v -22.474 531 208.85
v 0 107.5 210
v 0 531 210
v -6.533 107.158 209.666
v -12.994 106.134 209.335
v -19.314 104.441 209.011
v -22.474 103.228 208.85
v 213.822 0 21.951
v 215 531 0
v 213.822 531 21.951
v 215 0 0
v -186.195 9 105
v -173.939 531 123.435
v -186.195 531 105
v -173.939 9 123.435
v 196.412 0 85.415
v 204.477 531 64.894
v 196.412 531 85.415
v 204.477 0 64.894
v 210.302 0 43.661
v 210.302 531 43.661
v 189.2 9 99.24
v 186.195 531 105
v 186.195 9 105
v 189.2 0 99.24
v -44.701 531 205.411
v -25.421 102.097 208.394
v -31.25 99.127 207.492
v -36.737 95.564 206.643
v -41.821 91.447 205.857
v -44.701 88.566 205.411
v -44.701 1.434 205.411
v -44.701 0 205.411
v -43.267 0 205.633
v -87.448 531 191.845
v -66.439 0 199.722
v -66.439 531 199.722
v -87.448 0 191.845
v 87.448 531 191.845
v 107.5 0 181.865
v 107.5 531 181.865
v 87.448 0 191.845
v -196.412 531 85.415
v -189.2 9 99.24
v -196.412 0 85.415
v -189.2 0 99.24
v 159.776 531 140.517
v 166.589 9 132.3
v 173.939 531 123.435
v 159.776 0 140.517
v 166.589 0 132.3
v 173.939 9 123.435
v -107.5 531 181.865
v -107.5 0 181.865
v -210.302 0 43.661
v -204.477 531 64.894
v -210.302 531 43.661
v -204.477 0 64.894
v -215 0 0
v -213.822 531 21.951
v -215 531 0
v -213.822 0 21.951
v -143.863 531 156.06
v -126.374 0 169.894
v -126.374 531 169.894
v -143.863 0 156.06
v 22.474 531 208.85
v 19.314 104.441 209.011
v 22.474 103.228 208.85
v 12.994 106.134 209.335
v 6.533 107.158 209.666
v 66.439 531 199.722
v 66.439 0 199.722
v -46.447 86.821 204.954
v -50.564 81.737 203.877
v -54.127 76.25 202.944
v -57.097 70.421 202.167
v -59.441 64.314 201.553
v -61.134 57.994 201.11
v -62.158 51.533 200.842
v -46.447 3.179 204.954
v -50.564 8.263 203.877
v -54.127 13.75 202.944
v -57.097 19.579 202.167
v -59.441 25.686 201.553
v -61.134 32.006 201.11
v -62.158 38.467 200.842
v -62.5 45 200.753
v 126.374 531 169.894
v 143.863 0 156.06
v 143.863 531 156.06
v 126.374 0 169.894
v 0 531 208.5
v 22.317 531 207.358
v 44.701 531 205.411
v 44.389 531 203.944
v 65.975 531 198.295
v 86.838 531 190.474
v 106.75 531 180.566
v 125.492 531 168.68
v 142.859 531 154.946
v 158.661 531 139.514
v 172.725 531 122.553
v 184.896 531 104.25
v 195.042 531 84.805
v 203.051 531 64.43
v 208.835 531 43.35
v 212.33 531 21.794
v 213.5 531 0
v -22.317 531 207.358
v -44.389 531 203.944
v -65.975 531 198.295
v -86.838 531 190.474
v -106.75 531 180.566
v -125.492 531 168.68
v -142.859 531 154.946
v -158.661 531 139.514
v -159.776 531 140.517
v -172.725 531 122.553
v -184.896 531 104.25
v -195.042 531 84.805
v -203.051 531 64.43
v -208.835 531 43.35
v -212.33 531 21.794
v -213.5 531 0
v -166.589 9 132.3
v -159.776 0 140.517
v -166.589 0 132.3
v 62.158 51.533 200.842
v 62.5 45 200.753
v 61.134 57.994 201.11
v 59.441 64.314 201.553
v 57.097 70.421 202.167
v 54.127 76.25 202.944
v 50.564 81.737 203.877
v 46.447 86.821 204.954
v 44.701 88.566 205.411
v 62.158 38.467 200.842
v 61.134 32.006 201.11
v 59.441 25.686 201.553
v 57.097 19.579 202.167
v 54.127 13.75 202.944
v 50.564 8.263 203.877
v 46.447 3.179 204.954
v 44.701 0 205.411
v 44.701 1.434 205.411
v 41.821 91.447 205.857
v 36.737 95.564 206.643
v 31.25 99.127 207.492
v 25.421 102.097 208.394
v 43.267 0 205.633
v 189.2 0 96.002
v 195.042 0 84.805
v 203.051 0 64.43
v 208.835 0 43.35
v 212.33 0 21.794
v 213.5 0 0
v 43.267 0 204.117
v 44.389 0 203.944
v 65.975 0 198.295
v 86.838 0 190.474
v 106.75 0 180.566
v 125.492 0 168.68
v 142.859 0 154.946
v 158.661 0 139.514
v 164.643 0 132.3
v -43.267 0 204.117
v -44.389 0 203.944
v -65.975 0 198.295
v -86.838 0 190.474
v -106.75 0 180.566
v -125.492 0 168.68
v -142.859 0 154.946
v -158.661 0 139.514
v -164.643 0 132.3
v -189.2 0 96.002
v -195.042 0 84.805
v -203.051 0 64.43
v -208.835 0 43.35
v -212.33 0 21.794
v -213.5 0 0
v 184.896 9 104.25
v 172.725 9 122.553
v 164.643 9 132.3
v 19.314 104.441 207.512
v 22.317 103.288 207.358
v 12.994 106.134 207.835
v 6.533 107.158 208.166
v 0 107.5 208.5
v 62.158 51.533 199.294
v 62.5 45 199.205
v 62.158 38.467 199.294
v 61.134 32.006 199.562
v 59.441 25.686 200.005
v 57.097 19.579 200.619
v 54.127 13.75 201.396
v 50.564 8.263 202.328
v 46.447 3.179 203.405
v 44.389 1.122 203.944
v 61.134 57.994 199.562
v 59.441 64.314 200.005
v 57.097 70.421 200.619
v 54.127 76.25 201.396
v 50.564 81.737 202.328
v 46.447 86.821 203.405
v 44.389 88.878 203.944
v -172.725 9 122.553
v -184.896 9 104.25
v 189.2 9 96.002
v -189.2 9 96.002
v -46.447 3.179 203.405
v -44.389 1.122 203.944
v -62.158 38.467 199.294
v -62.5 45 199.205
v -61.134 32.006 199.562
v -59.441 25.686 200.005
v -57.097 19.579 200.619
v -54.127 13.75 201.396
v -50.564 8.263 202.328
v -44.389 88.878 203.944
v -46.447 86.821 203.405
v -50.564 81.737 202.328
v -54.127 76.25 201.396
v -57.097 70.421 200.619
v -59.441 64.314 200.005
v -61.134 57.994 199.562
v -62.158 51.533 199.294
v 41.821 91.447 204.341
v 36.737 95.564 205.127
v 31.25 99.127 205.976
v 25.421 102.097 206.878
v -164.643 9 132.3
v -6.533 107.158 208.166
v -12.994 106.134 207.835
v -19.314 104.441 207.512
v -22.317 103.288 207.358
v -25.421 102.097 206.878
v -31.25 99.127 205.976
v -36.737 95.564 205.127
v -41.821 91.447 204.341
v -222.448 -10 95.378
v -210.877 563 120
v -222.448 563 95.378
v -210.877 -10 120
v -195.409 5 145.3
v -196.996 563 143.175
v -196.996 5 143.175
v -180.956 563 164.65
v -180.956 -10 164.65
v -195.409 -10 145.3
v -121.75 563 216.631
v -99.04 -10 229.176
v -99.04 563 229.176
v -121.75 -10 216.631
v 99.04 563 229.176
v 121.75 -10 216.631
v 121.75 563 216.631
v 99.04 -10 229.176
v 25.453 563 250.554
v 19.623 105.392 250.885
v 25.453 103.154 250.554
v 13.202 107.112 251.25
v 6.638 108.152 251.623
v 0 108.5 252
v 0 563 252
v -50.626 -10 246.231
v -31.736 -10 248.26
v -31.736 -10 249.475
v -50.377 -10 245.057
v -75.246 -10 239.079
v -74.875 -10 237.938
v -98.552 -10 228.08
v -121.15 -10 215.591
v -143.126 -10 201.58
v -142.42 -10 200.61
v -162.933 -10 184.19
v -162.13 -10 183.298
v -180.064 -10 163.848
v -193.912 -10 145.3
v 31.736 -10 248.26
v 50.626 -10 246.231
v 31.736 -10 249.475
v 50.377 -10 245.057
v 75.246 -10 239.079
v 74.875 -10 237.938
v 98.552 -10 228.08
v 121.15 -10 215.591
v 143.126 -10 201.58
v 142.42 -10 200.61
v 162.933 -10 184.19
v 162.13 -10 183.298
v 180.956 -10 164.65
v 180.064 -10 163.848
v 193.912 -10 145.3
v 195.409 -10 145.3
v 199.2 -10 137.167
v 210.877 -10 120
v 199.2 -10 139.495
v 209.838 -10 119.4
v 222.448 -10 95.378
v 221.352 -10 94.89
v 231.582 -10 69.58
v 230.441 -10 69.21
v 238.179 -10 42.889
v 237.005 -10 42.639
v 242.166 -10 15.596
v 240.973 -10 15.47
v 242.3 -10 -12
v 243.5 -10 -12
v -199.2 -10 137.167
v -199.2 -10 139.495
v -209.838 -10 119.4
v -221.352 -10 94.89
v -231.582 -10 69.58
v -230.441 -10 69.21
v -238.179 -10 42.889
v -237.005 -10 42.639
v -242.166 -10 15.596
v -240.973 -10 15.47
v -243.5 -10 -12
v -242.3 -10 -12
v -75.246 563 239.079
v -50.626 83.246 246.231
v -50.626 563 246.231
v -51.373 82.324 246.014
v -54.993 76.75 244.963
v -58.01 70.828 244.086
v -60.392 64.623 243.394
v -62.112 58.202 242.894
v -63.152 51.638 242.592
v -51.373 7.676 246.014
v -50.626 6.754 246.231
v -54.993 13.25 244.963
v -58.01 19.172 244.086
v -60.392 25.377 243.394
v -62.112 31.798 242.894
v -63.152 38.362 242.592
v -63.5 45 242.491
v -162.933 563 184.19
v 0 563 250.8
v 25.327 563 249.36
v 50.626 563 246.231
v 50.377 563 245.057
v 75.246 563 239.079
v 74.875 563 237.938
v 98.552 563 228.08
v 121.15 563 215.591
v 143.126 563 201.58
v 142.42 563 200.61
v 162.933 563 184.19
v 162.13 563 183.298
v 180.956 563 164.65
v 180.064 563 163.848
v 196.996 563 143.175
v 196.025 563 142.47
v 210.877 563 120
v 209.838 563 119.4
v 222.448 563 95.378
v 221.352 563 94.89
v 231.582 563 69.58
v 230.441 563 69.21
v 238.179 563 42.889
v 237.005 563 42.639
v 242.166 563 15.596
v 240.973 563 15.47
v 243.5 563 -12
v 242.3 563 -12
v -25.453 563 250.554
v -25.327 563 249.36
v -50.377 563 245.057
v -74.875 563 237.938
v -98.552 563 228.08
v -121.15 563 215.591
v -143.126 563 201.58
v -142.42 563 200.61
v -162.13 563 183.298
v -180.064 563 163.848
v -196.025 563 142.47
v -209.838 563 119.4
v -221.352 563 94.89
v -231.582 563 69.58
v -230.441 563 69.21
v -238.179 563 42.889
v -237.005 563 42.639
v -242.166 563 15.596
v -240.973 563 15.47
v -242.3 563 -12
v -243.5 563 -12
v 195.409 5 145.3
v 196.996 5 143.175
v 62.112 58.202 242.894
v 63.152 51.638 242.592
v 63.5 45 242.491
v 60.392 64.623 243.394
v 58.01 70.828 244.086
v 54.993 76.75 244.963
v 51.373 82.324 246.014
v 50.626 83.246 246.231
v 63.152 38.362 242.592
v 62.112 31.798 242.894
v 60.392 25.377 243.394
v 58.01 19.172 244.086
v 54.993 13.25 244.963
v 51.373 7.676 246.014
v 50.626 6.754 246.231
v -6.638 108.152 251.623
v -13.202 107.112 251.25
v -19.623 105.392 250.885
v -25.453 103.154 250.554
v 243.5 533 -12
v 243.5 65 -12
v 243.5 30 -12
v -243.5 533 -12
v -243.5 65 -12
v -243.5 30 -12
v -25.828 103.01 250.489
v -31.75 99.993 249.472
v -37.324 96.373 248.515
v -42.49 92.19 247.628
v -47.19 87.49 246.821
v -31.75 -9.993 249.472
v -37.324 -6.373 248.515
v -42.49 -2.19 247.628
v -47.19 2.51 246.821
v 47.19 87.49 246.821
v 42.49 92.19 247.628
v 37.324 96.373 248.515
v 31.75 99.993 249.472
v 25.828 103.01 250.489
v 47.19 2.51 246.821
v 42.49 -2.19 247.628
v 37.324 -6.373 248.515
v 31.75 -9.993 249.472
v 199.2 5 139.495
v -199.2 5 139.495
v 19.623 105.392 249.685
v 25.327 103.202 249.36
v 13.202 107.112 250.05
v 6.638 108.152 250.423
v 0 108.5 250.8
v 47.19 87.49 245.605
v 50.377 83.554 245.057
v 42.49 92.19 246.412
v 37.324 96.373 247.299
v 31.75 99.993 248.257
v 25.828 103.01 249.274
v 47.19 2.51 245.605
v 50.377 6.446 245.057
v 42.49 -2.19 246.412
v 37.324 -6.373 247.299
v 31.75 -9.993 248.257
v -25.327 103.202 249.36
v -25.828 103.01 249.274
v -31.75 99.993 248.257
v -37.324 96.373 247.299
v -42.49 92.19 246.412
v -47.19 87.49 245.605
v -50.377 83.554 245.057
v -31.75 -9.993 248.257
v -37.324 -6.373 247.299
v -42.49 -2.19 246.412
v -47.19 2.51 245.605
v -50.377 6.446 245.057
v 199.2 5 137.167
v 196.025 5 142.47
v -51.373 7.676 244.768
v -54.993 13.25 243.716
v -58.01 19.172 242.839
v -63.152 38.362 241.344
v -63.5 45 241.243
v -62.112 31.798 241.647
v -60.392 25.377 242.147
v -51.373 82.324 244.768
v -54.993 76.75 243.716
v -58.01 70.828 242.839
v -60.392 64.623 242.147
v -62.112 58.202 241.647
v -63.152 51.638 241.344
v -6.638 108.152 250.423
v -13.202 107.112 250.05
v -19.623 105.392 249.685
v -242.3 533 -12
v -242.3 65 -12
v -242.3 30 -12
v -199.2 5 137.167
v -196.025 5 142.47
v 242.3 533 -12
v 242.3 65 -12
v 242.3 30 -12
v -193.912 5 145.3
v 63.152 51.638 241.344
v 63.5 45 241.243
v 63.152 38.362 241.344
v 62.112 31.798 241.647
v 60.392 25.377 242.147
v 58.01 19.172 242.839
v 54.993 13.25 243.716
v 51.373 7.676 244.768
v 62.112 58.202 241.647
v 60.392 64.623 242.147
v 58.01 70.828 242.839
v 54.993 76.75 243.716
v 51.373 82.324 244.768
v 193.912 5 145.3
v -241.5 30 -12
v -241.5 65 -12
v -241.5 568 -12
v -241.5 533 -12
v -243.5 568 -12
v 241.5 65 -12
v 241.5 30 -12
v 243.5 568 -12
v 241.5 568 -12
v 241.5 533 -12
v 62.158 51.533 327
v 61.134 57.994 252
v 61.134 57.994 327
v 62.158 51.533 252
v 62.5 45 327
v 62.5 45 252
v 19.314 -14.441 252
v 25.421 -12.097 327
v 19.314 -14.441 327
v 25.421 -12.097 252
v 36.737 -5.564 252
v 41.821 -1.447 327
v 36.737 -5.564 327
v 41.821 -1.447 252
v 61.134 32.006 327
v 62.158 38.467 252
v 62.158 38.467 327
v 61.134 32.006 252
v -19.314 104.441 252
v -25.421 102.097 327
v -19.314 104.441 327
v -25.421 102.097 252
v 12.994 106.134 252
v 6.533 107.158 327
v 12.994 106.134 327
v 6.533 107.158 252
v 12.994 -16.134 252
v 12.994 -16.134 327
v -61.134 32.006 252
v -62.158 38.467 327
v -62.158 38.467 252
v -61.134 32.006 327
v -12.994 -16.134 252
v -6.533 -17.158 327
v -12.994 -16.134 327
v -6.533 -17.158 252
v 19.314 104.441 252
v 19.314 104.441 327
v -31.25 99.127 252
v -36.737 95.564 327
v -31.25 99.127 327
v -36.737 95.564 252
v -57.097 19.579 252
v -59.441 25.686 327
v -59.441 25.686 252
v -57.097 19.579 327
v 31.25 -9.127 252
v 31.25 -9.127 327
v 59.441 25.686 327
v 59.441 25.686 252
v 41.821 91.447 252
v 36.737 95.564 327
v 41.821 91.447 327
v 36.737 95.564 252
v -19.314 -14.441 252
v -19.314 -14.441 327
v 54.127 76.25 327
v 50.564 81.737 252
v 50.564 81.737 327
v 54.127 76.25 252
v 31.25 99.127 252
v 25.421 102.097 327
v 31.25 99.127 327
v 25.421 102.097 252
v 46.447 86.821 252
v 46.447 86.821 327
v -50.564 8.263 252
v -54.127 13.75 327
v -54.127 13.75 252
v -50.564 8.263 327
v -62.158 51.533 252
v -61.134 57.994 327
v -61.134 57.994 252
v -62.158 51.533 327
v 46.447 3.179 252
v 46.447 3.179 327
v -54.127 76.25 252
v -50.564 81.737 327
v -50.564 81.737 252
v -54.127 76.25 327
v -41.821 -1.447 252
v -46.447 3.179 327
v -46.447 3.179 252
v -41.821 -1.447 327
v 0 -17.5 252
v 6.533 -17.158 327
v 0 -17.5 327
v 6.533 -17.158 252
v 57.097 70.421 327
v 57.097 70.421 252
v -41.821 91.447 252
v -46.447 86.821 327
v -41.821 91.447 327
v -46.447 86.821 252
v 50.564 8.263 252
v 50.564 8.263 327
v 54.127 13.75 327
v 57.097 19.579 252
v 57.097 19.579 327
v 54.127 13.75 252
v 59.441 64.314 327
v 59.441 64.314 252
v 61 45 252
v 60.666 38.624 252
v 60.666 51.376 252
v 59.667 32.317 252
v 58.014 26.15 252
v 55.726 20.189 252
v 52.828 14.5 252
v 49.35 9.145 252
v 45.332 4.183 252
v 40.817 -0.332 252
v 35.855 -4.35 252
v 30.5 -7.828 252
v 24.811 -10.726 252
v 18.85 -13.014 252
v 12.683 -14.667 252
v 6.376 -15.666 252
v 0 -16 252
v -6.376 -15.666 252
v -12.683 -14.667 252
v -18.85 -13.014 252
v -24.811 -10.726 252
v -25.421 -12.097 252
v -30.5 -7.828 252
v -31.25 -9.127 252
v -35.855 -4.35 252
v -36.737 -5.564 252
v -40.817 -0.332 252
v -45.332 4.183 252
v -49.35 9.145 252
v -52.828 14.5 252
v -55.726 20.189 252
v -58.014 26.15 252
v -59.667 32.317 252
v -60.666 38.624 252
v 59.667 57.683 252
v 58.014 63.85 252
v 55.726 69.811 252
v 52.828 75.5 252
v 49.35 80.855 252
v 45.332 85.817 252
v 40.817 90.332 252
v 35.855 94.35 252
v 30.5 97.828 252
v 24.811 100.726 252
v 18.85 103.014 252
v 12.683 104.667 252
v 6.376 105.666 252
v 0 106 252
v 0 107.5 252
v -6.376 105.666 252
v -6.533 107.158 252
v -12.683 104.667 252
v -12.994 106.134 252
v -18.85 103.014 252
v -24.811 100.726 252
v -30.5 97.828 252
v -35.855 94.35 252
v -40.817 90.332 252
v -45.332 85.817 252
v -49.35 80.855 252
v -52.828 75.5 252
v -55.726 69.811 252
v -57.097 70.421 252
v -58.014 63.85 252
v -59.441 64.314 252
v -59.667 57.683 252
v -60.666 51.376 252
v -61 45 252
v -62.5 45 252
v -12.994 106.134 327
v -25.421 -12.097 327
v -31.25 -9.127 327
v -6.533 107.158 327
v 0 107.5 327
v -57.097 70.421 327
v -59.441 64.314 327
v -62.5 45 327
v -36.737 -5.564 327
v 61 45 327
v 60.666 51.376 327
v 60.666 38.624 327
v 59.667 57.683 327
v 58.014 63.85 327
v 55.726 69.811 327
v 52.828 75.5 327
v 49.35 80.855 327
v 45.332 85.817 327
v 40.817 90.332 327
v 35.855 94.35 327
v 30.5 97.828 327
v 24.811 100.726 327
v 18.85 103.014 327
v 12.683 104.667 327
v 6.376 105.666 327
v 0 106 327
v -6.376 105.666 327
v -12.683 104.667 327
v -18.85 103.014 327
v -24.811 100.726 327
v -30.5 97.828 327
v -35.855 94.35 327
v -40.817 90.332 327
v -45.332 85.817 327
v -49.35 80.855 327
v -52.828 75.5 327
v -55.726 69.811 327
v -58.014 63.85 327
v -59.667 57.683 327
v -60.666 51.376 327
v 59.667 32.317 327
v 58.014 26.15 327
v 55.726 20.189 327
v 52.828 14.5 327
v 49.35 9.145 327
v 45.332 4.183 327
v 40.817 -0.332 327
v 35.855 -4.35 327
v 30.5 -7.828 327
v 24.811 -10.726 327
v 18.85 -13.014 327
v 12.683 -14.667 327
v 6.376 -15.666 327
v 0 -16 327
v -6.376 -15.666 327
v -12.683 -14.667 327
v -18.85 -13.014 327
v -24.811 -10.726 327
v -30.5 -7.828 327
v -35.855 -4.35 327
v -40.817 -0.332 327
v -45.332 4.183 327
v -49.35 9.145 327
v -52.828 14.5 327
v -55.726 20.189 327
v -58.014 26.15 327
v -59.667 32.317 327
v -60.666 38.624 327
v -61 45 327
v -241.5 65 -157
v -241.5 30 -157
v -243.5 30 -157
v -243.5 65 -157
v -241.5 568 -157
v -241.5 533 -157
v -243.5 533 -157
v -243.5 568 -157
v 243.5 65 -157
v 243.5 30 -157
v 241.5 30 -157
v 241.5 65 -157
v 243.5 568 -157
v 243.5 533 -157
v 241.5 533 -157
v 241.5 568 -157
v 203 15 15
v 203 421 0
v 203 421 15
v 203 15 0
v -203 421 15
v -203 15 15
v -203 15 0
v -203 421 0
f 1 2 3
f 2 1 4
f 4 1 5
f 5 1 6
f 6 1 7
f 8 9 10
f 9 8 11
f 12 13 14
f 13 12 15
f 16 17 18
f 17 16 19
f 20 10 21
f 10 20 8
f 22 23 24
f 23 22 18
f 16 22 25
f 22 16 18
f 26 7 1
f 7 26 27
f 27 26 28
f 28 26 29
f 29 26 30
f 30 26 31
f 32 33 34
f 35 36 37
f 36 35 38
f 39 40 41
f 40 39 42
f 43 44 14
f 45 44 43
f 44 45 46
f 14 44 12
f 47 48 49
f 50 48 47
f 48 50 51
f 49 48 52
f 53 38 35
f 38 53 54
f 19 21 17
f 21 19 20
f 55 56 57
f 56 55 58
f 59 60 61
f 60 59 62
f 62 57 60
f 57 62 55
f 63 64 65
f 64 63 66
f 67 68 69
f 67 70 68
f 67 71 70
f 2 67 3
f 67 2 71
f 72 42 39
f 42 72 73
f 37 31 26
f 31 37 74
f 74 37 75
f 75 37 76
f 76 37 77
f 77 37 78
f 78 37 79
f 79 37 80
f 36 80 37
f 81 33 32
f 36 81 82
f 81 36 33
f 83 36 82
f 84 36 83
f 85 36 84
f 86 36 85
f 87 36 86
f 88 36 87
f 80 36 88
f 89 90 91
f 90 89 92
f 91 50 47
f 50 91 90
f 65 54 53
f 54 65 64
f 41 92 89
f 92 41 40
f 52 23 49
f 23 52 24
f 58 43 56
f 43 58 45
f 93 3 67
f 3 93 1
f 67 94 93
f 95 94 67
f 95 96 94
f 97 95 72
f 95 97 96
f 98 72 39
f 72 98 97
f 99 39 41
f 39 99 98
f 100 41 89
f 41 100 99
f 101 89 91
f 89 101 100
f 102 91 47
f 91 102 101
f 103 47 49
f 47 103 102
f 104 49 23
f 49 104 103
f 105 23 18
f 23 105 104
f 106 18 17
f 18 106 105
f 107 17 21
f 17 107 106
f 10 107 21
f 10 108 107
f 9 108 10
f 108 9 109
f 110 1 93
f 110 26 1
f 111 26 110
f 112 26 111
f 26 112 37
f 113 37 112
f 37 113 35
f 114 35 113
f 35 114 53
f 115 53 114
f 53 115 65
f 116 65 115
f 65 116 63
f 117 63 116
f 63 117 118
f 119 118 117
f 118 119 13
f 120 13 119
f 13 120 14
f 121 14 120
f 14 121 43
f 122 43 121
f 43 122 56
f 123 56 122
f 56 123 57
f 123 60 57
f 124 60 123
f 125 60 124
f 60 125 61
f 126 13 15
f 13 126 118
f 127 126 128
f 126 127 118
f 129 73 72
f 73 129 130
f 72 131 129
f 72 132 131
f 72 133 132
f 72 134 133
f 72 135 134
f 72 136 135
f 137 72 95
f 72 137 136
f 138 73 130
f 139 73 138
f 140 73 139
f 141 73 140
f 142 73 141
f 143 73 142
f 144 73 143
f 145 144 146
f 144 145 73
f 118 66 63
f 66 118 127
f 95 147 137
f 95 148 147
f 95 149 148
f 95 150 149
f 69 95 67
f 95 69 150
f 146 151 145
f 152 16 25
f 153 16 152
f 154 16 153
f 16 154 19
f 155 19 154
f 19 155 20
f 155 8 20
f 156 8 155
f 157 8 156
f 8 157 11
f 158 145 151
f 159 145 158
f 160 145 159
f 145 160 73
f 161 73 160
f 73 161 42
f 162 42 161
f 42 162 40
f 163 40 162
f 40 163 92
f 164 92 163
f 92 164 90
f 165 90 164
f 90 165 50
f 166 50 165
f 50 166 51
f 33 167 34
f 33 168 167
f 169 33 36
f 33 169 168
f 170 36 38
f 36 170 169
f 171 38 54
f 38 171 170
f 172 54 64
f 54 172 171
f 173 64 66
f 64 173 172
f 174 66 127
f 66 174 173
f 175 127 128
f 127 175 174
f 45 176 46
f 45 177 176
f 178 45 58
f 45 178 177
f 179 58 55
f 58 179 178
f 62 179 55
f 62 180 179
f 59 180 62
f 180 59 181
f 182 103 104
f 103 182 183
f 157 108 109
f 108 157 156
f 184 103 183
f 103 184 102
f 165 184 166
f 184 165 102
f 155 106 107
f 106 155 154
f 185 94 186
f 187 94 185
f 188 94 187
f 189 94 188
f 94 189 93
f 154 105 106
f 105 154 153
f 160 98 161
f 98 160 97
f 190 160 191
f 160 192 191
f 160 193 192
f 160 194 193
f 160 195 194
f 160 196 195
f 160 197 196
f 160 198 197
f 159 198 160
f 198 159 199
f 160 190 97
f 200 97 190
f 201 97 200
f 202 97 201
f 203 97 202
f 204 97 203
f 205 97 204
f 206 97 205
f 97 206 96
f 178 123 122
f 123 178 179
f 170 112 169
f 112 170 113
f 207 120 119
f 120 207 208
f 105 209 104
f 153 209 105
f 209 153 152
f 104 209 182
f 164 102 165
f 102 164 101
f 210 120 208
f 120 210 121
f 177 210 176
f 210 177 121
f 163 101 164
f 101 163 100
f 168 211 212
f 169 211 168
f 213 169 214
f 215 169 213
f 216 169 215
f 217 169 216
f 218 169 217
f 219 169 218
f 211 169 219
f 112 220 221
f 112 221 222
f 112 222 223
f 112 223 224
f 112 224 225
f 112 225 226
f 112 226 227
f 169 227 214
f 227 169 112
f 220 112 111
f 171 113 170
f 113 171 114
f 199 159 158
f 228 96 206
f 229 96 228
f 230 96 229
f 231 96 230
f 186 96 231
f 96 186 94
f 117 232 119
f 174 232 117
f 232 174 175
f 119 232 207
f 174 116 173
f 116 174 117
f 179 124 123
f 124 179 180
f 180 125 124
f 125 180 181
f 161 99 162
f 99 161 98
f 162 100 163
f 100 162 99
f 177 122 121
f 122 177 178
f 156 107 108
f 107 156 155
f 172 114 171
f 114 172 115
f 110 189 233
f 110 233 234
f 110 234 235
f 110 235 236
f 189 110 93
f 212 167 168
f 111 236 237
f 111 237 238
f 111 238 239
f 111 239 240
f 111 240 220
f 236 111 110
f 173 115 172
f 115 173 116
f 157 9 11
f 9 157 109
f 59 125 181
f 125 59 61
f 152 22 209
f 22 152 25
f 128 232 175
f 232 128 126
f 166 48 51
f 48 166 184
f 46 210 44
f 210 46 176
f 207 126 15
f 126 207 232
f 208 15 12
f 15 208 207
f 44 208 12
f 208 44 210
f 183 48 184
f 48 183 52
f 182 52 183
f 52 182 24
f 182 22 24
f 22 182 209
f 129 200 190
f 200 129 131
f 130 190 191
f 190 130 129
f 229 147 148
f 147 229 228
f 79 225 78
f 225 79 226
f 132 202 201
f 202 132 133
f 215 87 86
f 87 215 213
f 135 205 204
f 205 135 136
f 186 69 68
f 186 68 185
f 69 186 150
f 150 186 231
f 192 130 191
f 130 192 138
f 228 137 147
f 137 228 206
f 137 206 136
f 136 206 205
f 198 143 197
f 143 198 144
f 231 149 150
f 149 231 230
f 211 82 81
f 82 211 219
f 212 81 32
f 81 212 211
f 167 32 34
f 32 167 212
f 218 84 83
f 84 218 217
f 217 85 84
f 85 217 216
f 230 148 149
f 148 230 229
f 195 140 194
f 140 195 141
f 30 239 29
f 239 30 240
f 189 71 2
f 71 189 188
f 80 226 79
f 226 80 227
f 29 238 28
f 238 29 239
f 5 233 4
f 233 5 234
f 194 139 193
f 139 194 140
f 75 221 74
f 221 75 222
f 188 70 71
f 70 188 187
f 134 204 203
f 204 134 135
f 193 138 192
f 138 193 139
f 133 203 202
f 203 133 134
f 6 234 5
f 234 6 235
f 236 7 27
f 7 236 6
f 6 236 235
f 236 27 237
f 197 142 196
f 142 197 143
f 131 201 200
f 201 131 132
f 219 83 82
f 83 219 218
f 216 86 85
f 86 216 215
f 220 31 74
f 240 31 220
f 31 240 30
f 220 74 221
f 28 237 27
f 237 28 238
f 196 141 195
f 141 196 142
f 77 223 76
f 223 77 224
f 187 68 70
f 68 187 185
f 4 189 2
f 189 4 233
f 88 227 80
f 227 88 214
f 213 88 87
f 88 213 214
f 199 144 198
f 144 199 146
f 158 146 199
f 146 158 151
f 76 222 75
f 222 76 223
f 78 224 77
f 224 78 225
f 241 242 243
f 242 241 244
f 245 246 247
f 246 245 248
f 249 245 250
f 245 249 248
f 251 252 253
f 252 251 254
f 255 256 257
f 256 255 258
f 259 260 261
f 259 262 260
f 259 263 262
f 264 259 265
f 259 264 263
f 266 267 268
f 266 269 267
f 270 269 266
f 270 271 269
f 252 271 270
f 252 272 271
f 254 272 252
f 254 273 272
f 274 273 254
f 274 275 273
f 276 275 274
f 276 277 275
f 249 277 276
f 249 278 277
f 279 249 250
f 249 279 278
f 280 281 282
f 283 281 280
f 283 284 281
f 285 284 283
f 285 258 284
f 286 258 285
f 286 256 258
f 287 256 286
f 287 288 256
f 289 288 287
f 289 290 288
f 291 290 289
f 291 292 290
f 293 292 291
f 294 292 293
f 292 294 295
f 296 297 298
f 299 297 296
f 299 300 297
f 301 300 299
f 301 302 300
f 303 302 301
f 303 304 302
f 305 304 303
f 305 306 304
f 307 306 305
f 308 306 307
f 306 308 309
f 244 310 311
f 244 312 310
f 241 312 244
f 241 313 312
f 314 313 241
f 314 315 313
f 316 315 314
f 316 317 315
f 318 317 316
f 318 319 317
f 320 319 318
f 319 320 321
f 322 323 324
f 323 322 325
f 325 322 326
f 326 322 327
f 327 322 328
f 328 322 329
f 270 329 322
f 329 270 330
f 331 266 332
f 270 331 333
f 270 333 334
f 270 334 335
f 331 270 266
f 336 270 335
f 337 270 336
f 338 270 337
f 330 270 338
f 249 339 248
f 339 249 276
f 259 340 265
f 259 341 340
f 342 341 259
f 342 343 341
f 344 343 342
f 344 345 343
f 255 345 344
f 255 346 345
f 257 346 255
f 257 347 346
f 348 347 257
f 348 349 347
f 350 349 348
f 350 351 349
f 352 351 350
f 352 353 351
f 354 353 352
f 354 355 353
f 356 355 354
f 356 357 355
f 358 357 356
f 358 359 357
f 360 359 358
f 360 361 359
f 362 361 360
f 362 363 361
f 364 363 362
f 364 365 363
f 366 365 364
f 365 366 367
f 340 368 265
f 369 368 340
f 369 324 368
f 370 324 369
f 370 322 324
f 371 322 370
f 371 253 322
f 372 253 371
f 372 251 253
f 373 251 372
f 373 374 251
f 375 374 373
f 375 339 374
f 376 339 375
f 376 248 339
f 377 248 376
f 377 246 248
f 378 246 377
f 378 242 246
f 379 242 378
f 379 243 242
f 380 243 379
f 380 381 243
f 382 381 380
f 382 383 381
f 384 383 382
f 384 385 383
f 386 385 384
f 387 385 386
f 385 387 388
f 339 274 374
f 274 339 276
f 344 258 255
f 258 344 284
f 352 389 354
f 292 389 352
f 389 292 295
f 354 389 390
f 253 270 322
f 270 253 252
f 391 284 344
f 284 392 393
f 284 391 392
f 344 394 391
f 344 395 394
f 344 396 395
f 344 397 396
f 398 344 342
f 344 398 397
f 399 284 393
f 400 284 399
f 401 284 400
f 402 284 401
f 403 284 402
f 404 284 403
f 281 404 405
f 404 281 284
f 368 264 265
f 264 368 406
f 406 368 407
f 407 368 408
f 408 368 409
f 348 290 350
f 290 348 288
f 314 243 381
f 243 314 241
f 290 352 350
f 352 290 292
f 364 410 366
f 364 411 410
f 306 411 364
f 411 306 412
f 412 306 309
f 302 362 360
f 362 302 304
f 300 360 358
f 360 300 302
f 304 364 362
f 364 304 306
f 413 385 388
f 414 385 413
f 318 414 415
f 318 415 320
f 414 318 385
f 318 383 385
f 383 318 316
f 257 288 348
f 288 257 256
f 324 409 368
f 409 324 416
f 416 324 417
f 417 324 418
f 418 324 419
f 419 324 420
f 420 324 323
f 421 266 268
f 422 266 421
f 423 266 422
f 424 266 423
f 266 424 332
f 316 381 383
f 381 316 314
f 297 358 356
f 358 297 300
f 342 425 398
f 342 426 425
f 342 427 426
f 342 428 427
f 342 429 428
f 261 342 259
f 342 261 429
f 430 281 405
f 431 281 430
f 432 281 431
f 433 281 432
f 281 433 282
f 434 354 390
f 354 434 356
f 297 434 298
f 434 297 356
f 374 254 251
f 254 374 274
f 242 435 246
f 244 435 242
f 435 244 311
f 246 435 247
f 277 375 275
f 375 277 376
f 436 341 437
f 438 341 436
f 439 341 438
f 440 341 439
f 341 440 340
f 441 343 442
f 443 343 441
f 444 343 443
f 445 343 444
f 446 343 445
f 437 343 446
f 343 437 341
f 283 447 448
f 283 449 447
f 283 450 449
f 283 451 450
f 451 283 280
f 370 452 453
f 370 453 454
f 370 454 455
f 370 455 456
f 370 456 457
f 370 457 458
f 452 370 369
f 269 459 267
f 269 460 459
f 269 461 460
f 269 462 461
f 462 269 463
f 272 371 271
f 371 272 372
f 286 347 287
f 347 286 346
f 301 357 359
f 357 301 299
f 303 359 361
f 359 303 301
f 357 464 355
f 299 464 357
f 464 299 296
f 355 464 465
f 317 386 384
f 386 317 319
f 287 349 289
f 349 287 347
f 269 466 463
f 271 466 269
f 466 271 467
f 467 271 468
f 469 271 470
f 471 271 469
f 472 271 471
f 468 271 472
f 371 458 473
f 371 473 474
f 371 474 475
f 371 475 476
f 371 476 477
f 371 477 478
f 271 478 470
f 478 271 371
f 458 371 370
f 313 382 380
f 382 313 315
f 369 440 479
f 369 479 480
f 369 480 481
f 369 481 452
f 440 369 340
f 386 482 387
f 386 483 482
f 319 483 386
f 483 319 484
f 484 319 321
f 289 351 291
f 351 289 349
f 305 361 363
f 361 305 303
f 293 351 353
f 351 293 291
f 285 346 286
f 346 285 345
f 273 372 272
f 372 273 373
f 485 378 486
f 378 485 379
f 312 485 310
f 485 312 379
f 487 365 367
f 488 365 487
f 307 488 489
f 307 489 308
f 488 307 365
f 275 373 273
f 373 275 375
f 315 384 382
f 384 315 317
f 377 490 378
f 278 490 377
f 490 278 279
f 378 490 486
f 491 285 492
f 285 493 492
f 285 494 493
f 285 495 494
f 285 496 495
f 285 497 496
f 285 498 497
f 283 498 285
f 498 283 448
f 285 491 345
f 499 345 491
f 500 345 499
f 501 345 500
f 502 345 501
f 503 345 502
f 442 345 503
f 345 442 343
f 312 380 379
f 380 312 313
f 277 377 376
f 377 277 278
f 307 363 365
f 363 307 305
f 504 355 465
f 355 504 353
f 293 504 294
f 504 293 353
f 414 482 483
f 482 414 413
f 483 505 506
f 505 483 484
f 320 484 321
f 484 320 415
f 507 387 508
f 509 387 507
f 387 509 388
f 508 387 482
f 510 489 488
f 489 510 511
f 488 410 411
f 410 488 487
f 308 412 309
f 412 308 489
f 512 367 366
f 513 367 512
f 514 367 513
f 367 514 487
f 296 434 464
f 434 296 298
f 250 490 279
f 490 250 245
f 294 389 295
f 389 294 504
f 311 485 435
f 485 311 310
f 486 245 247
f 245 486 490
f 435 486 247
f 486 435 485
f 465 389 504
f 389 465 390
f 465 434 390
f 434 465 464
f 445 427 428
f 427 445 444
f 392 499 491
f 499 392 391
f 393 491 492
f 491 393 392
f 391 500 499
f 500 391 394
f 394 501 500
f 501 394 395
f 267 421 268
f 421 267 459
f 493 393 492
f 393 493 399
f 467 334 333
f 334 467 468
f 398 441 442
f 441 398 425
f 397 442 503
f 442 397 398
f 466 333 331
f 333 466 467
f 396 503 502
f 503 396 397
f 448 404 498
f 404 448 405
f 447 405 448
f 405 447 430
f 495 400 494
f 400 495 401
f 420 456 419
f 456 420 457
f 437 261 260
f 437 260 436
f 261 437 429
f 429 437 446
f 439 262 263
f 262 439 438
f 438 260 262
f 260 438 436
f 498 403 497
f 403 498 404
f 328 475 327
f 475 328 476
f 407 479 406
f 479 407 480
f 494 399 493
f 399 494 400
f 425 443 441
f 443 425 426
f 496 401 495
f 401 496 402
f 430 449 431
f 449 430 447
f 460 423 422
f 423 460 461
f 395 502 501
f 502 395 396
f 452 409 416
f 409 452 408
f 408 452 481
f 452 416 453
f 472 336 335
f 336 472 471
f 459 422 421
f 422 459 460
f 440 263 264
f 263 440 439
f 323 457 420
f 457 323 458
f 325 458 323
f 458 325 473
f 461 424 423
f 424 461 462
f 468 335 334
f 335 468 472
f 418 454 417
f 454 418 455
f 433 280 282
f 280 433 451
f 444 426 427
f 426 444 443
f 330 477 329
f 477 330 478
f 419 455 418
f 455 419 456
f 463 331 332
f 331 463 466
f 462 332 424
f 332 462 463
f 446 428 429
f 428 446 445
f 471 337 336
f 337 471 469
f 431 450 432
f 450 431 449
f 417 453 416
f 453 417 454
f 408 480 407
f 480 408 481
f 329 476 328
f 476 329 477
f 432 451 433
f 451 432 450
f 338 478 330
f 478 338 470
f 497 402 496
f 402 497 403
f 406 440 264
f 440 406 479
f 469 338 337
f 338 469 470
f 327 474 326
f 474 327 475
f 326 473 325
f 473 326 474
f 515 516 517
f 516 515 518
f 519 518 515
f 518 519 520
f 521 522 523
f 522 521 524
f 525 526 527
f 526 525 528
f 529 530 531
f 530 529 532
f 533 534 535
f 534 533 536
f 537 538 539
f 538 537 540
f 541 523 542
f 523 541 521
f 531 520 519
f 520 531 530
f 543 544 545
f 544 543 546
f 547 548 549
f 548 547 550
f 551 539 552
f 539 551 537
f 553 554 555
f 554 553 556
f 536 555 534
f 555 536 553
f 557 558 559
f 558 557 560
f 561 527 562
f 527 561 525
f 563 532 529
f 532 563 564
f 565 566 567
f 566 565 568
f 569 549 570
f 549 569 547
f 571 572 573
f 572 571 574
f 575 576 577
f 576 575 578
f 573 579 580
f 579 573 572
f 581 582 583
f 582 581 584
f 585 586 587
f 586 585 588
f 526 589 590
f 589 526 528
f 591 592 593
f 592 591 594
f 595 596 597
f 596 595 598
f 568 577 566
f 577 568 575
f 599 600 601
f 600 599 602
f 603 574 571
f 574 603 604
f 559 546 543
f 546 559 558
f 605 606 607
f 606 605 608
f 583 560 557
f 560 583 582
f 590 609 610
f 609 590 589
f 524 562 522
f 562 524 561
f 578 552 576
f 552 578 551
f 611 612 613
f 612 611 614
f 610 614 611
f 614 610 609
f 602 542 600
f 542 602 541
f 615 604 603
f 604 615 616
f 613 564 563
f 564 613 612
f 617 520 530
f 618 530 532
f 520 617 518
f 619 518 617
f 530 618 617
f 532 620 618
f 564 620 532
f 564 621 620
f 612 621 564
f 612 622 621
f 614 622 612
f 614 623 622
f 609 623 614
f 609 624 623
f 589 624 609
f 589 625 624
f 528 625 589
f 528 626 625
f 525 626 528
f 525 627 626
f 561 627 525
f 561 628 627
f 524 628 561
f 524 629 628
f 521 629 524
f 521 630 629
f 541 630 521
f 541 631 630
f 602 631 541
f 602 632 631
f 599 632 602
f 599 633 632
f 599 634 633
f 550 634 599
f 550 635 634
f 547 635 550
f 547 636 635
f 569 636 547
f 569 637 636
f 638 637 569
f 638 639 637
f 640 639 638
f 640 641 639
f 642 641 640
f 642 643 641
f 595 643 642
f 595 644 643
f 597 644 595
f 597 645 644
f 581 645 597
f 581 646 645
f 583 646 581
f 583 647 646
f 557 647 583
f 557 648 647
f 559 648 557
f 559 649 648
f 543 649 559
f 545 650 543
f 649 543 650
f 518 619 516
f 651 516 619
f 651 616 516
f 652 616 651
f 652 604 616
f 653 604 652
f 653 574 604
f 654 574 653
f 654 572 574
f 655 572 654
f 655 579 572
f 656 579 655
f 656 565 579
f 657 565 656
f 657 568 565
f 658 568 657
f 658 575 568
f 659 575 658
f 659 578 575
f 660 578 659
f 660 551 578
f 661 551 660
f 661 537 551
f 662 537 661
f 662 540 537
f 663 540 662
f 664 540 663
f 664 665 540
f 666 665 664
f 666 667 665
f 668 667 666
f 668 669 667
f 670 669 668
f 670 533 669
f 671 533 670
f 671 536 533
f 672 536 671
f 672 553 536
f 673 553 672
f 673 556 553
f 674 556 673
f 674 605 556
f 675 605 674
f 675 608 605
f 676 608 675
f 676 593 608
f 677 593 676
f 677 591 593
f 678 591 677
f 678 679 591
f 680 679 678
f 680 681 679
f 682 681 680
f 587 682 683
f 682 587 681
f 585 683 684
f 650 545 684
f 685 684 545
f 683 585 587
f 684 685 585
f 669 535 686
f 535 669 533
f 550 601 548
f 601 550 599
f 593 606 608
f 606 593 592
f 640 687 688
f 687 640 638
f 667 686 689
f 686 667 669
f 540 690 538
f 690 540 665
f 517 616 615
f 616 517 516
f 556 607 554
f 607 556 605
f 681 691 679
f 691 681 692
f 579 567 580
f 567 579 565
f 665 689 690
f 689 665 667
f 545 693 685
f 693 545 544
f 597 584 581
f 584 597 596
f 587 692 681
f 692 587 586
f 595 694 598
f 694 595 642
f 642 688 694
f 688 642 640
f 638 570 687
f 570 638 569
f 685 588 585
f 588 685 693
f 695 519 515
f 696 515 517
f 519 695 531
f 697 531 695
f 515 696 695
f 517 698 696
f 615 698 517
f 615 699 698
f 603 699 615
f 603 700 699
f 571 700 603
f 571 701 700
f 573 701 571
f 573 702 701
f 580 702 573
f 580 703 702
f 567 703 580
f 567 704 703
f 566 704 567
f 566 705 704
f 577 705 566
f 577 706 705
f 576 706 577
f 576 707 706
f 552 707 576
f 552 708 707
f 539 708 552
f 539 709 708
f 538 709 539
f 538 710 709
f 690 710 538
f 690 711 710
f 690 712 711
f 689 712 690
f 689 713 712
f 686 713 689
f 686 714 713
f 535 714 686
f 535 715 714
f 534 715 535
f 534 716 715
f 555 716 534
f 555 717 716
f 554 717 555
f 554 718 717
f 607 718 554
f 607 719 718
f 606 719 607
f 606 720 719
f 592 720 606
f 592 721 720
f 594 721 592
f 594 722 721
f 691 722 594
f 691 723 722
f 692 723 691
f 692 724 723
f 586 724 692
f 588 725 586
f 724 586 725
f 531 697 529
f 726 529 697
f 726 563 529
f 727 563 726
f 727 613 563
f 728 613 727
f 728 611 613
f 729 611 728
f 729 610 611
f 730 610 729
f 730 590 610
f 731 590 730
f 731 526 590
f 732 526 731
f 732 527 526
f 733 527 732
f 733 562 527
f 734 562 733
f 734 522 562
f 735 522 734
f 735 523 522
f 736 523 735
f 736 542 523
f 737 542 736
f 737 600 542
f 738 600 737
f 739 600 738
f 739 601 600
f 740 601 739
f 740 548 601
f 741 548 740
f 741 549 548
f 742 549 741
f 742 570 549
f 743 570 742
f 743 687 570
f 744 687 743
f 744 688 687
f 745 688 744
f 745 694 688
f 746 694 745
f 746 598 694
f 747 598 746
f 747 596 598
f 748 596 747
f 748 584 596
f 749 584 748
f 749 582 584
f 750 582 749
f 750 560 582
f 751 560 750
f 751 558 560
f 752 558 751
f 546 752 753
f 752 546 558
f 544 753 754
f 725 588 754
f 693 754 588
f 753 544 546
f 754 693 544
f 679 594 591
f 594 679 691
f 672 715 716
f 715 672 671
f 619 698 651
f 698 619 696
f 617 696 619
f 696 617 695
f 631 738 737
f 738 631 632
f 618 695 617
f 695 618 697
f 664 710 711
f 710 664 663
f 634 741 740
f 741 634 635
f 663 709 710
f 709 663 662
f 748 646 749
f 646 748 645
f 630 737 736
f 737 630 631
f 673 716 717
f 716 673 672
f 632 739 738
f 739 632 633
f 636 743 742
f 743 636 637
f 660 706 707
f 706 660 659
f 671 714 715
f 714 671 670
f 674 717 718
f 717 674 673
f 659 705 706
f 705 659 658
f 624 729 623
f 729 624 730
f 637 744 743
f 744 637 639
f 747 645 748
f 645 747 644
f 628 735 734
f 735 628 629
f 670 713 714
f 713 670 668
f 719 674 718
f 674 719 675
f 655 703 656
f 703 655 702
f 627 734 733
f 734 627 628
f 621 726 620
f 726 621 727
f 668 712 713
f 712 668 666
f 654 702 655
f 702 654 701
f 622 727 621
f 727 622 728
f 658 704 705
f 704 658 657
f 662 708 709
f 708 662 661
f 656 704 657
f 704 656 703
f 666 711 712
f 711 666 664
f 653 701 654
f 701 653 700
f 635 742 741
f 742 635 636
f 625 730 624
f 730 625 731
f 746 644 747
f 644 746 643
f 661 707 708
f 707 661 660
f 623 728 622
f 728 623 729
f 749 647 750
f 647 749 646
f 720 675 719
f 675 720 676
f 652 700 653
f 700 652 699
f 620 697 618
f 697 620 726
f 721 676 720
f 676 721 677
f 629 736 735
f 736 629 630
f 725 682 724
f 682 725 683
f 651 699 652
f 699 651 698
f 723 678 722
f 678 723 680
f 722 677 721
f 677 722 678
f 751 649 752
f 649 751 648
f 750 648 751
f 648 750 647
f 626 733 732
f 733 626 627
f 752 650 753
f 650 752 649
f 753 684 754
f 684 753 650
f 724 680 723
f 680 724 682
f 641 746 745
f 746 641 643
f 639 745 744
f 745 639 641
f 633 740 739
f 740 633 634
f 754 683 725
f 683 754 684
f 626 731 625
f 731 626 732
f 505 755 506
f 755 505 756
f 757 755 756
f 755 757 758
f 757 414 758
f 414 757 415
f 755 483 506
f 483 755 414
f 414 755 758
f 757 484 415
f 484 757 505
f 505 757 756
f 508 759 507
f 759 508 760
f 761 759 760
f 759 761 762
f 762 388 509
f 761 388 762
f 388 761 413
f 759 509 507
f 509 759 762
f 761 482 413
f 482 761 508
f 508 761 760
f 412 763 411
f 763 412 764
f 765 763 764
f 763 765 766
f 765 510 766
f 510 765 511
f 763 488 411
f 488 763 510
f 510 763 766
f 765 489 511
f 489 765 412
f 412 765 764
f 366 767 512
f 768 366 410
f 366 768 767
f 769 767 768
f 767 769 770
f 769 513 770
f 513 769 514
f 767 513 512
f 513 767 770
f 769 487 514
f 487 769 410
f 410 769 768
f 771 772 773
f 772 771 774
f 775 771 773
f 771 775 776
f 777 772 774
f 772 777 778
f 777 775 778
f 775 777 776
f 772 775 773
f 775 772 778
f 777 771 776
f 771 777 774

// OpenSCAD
// OpenSCAD Parametric Neapolitan Pizza Oven Model
// Generated automatically by cad/model_generator.py

$fn = 60;

// Master Parameters
stone_width = 406.0;
stone_depth = 406.0;
stone_thickness = 15.0;

chamber_width = 430.0;
chamber_depth = 531.0;
dome_apex_height = 210.0;
inner_sheet_t = 1.5;

mouth_height = 132.3;
mouth_width = 378.4;

insulation_cavity = 27.0;
outer_sheet_t = 1.2;
outer_width = 487.0;
outer_depth = 573.0;
outer_height = 264.0;

flue_diameter = 125.0;
chimney_collar_h = 75.0;
leg_height = 145.0;

module baking_stone() {
    color([0.85, 0.75, 0.65])
    translate([-stone_width/2, 15, 0])
    cube([stone_width, stone_depth, stone_thickness]);
}

module inner_dome() {
    color([0.85, 0.88, 0.90])
    difference() {
        // Outer arch
        translate([0, 0, 0])
        rotate([-90, 0, 0])
        linear_extrude(chamber_depth)
        scale([chamber_width/2, dome_apex_height])
        circle(r=1);

        // Hollow interior
        translate([0, -1, 0])
        rotate([-90, 0, 0])
        linear_extrude(chamber_depth + 2)
        scale([(chamber_width/2) - inner_sheet_t, dome_apex_height - inner_sheet_t])
        circle(r=1);

        // Flat bottom floor cut
        translate([-chamber_width, -1, -dome_apex_height])
        cube([2 * chamber_width, chamber_depth + 2, dome_apex_height]);

        // Front mouth opening (Neapolitan 63% rule)
        translate([-mouth_width/2, -1, 0])
        cube([mouth_width, 10, mouth_height]);

        // Flue chimney exhaust hole
        translate([0, 45, dome_apex_height - 20])
        cylinder(r=flue_diameter/2, h=50);
    }
}

module outer_shroud() {
    color([0.2, 0.2, 0.22, 0.85])
    difference() {
        translate([0, -10, -12])
        rotate([-90, 0, 0])
        linear_extrude(outer_depth)
        scale([outer_width/2, outer_height])
        circle(r=1);

        // Inner cavity
        translate([0, -12, -12])
        rotate([-90, 0, 0])
        linear_extrude(outer_depth + 4)
        scale([(outer_width/2) - outer_sheet_t, outer_height - outer_sheet_t])
        circle(r=1);

        // Bottom cut
        translate([-outer_width, -15, -outer_height - 12])
        cube([2 * outer_width, outer_depth + 10, outer_height]);

        // Front face opening
        translate([-mouth_width/2 - 10, -15, -12])
        cube([mouth_width + 20, 20, mouth_height + 25]);

        // Flue collar penetration
        translate([0, 45, outer_height - 30])
        cylinder(r=(flue_diameter/2) + 1, h=60);
    }
}

module chimney_collar() {
    color([0.9, 0.9, 0.92])
    translate([0, 45, outer_height - 12])
    difference() {
        cylinder(r=flue_diameter/2, h=chimney_collar_h);
        translate([0, 0, -1])
        cylinder(r=(flue_diameter/2) - 1.5, h=chimney_collar_h + 2);
    }
}

module folding_legs() {
    color([0.7, 0.7, 0.72])
    for (lx = [-outer_width/2, outer_width/2 - 2]) {
        for (ly = [30, outer_depth - 40]) {
            translate([lx, ly, -12 - leg_height])
            cube([2.0, 35.0, leg_height]);
        }
    }
}

// Full Assembly
baking_stone();
inner_dome();
outer_shroud();
chimney_collar();
folding_legs();
